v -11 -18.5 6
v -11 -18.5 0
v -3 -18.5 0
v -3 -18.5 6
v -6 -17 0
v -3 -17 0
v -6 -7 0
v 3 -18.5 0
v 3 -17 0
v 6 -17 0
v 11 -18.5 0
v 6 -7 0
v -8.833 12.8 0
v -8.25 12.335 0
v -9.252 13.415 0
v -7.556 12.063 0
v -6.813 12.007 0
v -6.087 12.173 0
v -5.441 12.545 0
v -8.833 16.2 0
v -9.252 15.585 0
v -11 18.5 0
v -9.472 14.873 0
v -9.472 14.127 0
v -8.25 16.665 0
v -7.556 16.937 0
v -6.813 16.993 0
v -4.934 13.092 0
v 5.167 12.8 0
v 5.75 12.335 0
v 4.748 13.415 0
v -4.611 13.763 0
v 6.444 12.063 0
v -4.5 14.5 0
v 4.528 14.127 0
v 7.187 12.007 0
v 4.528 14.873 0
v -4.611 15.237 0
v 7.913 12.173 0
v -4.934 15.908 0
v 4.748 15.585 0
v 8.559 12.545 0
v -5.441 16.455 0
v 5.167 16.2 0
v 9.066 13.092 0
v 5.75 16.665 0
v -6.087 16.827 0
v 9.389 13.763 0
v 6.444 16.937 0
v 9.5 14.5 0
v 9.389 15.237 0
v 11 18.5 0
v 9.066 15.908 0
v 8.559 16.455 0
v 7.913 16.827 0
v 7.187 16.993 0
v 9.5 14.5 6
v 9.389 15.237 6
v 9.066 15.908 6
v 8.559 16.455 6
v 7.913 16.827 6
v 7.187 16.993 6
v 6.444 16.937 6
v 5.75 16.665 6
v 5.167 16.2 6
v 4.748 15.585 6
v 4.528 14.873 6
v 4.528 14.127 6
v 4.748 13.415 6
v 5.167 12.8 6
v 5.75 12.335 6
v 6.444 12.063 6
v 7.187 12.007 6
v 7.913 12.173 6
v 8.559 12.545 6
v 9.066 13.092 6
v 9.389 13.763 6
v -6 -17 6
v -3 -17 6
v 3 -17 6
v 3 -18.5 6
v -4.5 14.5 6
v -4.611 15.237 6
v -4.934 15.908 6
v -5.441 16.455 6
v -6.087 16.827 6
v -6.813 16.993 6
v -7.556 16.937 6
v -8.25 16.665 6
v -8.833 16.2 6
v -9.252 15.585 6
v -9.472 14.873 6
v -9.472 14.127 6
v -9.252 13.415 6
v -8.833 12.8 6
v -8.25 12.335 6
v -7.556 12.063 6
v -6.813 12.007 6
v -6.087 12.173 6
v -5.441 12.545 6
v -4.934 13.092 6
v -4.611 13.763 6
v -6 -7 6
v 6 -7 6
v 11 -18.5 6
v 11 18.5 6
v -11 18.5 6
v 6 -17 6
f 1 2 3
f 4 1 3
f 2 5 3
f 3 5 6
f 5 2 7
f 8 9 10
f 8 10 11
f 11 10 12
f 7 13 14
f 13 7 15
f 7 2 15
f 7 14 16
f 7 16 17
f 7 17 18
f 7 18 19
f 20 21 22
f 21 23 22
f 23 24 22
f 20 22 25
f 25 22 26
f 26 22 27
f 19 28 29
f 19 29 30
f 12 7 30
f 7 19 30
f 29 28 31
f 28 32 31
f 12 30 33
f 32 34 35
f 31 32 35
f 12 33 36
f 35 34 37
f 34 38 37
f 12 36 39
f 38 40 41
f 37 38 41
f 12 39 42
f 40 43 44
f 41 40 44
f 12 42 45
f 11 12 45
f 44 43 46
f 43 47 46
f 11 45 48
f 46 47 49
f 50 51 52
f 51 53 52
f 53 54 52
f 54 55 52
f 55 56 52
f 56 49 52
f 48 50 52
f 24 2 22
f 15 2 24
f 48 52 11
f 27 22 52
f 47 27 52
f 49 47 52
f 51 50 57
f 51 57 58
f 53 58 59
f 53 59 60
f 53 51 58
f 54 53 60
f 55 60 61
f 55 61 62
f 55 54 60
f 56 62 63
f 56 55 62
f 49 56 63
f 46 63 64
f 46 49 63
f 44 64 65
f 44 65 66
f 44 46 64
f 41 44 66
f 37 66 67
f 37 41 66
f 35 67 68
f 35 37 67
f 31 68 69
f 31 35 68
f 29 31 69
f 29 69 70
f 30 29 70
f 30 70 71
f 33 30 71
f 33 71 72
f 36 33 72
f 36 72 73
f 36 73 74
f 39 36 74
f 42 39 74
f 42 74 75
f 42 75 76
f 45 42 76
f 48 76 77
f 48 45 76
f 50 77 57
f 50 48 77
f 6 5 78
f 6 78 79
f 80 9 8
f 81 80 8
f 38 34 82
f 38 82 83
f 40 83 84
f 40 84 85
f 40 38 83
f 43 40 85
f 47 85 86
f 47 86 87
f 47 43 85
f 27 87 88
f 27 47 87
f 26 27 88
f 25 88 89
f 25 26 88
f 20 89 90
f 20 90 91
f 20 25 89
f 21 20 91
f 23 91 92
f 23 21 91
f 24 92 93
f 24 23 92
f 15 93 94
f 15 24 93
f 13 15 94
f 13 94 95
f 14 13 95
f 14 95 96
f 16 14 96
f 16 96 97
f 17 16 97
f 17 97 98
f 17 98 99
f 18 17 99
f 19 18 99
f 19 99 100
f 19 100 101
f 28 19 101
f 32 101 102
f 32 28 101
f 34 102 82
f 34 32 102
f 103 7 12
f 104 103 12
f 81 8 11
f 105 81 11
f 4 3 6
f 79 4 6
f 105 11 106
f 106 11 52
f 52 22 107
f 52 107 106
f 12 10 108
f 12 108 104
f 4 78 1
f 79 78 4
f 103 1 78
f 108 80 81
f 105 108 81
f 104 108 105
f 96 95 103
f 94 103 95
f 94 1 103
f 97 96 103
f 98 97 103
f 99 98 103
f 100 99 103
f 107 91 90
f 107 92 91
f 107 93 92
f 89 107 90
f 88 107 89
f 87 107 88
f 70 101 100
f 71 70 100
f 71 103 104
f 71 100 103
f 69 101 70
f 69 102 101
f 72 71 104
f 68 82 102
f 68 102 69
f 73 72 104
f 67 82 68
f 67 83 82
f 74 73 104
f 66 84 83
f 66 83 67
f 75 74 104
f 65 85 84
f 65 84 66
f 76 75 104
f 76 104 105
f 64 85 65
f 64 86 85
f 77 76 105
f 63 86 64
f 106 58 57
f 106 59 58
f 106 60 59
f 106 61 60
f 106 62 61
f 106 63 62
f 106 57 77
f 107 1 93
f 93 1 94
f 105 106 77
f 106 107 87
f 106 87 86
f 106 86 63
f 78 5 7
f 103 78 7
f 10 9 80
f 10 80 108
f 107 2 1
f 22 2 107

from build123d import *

# Parameters (mm, degrees)
SKETCH1_W           = 22
SKETCH1_H           = 37
SKETCH1_R           = 2.5
SKETCH1_W_2         = 12
SKETCH1_H_2         = 10
BOSS_EXTRUDE2_DEPTH = 6
CUT_EXTRUDE2_DEPTH  = 6


with BuildPart() as part:
    # Sketch1 → Boss-Extrude2 (new body)
    with BuildSketch(Plane.XY):
        Rectangle(SKETCH1_W, SKETCH1_H)
        with Locations((-7, 14.5)):
            Circle(SKETCH1_R, mode=Mode.SUBTRACT)
        with Locations((7, 14.5)):
            Circle(SKETCH1_R, mode=Mode.SUBTRACT)
        with Locations((0, -12)):
            Rectangle(SKETCH1_W_2, SKETCH1_H_2, mode=Mode.SUBTRACT)
    extrude(amount=BOSS_EXTRUDE2_DEPTH)

    # Sketch3 → Cut-Extrude2 (cut)
    with BuildSketch(Plane(origin=(0, 0, 0), x_dir=(-1, 0, 0), z_dir=(0, 0, -1))):
        Polygon((0, -17), (-3, -17), (-3, -18.5), (0, -18.5), (3, -18.5), (3, -17), align=None)
    extrude(amount=-CUT_EXTRUDE2_DEPTH, mode=Mode.SUBTRACT)


solid = part.part
